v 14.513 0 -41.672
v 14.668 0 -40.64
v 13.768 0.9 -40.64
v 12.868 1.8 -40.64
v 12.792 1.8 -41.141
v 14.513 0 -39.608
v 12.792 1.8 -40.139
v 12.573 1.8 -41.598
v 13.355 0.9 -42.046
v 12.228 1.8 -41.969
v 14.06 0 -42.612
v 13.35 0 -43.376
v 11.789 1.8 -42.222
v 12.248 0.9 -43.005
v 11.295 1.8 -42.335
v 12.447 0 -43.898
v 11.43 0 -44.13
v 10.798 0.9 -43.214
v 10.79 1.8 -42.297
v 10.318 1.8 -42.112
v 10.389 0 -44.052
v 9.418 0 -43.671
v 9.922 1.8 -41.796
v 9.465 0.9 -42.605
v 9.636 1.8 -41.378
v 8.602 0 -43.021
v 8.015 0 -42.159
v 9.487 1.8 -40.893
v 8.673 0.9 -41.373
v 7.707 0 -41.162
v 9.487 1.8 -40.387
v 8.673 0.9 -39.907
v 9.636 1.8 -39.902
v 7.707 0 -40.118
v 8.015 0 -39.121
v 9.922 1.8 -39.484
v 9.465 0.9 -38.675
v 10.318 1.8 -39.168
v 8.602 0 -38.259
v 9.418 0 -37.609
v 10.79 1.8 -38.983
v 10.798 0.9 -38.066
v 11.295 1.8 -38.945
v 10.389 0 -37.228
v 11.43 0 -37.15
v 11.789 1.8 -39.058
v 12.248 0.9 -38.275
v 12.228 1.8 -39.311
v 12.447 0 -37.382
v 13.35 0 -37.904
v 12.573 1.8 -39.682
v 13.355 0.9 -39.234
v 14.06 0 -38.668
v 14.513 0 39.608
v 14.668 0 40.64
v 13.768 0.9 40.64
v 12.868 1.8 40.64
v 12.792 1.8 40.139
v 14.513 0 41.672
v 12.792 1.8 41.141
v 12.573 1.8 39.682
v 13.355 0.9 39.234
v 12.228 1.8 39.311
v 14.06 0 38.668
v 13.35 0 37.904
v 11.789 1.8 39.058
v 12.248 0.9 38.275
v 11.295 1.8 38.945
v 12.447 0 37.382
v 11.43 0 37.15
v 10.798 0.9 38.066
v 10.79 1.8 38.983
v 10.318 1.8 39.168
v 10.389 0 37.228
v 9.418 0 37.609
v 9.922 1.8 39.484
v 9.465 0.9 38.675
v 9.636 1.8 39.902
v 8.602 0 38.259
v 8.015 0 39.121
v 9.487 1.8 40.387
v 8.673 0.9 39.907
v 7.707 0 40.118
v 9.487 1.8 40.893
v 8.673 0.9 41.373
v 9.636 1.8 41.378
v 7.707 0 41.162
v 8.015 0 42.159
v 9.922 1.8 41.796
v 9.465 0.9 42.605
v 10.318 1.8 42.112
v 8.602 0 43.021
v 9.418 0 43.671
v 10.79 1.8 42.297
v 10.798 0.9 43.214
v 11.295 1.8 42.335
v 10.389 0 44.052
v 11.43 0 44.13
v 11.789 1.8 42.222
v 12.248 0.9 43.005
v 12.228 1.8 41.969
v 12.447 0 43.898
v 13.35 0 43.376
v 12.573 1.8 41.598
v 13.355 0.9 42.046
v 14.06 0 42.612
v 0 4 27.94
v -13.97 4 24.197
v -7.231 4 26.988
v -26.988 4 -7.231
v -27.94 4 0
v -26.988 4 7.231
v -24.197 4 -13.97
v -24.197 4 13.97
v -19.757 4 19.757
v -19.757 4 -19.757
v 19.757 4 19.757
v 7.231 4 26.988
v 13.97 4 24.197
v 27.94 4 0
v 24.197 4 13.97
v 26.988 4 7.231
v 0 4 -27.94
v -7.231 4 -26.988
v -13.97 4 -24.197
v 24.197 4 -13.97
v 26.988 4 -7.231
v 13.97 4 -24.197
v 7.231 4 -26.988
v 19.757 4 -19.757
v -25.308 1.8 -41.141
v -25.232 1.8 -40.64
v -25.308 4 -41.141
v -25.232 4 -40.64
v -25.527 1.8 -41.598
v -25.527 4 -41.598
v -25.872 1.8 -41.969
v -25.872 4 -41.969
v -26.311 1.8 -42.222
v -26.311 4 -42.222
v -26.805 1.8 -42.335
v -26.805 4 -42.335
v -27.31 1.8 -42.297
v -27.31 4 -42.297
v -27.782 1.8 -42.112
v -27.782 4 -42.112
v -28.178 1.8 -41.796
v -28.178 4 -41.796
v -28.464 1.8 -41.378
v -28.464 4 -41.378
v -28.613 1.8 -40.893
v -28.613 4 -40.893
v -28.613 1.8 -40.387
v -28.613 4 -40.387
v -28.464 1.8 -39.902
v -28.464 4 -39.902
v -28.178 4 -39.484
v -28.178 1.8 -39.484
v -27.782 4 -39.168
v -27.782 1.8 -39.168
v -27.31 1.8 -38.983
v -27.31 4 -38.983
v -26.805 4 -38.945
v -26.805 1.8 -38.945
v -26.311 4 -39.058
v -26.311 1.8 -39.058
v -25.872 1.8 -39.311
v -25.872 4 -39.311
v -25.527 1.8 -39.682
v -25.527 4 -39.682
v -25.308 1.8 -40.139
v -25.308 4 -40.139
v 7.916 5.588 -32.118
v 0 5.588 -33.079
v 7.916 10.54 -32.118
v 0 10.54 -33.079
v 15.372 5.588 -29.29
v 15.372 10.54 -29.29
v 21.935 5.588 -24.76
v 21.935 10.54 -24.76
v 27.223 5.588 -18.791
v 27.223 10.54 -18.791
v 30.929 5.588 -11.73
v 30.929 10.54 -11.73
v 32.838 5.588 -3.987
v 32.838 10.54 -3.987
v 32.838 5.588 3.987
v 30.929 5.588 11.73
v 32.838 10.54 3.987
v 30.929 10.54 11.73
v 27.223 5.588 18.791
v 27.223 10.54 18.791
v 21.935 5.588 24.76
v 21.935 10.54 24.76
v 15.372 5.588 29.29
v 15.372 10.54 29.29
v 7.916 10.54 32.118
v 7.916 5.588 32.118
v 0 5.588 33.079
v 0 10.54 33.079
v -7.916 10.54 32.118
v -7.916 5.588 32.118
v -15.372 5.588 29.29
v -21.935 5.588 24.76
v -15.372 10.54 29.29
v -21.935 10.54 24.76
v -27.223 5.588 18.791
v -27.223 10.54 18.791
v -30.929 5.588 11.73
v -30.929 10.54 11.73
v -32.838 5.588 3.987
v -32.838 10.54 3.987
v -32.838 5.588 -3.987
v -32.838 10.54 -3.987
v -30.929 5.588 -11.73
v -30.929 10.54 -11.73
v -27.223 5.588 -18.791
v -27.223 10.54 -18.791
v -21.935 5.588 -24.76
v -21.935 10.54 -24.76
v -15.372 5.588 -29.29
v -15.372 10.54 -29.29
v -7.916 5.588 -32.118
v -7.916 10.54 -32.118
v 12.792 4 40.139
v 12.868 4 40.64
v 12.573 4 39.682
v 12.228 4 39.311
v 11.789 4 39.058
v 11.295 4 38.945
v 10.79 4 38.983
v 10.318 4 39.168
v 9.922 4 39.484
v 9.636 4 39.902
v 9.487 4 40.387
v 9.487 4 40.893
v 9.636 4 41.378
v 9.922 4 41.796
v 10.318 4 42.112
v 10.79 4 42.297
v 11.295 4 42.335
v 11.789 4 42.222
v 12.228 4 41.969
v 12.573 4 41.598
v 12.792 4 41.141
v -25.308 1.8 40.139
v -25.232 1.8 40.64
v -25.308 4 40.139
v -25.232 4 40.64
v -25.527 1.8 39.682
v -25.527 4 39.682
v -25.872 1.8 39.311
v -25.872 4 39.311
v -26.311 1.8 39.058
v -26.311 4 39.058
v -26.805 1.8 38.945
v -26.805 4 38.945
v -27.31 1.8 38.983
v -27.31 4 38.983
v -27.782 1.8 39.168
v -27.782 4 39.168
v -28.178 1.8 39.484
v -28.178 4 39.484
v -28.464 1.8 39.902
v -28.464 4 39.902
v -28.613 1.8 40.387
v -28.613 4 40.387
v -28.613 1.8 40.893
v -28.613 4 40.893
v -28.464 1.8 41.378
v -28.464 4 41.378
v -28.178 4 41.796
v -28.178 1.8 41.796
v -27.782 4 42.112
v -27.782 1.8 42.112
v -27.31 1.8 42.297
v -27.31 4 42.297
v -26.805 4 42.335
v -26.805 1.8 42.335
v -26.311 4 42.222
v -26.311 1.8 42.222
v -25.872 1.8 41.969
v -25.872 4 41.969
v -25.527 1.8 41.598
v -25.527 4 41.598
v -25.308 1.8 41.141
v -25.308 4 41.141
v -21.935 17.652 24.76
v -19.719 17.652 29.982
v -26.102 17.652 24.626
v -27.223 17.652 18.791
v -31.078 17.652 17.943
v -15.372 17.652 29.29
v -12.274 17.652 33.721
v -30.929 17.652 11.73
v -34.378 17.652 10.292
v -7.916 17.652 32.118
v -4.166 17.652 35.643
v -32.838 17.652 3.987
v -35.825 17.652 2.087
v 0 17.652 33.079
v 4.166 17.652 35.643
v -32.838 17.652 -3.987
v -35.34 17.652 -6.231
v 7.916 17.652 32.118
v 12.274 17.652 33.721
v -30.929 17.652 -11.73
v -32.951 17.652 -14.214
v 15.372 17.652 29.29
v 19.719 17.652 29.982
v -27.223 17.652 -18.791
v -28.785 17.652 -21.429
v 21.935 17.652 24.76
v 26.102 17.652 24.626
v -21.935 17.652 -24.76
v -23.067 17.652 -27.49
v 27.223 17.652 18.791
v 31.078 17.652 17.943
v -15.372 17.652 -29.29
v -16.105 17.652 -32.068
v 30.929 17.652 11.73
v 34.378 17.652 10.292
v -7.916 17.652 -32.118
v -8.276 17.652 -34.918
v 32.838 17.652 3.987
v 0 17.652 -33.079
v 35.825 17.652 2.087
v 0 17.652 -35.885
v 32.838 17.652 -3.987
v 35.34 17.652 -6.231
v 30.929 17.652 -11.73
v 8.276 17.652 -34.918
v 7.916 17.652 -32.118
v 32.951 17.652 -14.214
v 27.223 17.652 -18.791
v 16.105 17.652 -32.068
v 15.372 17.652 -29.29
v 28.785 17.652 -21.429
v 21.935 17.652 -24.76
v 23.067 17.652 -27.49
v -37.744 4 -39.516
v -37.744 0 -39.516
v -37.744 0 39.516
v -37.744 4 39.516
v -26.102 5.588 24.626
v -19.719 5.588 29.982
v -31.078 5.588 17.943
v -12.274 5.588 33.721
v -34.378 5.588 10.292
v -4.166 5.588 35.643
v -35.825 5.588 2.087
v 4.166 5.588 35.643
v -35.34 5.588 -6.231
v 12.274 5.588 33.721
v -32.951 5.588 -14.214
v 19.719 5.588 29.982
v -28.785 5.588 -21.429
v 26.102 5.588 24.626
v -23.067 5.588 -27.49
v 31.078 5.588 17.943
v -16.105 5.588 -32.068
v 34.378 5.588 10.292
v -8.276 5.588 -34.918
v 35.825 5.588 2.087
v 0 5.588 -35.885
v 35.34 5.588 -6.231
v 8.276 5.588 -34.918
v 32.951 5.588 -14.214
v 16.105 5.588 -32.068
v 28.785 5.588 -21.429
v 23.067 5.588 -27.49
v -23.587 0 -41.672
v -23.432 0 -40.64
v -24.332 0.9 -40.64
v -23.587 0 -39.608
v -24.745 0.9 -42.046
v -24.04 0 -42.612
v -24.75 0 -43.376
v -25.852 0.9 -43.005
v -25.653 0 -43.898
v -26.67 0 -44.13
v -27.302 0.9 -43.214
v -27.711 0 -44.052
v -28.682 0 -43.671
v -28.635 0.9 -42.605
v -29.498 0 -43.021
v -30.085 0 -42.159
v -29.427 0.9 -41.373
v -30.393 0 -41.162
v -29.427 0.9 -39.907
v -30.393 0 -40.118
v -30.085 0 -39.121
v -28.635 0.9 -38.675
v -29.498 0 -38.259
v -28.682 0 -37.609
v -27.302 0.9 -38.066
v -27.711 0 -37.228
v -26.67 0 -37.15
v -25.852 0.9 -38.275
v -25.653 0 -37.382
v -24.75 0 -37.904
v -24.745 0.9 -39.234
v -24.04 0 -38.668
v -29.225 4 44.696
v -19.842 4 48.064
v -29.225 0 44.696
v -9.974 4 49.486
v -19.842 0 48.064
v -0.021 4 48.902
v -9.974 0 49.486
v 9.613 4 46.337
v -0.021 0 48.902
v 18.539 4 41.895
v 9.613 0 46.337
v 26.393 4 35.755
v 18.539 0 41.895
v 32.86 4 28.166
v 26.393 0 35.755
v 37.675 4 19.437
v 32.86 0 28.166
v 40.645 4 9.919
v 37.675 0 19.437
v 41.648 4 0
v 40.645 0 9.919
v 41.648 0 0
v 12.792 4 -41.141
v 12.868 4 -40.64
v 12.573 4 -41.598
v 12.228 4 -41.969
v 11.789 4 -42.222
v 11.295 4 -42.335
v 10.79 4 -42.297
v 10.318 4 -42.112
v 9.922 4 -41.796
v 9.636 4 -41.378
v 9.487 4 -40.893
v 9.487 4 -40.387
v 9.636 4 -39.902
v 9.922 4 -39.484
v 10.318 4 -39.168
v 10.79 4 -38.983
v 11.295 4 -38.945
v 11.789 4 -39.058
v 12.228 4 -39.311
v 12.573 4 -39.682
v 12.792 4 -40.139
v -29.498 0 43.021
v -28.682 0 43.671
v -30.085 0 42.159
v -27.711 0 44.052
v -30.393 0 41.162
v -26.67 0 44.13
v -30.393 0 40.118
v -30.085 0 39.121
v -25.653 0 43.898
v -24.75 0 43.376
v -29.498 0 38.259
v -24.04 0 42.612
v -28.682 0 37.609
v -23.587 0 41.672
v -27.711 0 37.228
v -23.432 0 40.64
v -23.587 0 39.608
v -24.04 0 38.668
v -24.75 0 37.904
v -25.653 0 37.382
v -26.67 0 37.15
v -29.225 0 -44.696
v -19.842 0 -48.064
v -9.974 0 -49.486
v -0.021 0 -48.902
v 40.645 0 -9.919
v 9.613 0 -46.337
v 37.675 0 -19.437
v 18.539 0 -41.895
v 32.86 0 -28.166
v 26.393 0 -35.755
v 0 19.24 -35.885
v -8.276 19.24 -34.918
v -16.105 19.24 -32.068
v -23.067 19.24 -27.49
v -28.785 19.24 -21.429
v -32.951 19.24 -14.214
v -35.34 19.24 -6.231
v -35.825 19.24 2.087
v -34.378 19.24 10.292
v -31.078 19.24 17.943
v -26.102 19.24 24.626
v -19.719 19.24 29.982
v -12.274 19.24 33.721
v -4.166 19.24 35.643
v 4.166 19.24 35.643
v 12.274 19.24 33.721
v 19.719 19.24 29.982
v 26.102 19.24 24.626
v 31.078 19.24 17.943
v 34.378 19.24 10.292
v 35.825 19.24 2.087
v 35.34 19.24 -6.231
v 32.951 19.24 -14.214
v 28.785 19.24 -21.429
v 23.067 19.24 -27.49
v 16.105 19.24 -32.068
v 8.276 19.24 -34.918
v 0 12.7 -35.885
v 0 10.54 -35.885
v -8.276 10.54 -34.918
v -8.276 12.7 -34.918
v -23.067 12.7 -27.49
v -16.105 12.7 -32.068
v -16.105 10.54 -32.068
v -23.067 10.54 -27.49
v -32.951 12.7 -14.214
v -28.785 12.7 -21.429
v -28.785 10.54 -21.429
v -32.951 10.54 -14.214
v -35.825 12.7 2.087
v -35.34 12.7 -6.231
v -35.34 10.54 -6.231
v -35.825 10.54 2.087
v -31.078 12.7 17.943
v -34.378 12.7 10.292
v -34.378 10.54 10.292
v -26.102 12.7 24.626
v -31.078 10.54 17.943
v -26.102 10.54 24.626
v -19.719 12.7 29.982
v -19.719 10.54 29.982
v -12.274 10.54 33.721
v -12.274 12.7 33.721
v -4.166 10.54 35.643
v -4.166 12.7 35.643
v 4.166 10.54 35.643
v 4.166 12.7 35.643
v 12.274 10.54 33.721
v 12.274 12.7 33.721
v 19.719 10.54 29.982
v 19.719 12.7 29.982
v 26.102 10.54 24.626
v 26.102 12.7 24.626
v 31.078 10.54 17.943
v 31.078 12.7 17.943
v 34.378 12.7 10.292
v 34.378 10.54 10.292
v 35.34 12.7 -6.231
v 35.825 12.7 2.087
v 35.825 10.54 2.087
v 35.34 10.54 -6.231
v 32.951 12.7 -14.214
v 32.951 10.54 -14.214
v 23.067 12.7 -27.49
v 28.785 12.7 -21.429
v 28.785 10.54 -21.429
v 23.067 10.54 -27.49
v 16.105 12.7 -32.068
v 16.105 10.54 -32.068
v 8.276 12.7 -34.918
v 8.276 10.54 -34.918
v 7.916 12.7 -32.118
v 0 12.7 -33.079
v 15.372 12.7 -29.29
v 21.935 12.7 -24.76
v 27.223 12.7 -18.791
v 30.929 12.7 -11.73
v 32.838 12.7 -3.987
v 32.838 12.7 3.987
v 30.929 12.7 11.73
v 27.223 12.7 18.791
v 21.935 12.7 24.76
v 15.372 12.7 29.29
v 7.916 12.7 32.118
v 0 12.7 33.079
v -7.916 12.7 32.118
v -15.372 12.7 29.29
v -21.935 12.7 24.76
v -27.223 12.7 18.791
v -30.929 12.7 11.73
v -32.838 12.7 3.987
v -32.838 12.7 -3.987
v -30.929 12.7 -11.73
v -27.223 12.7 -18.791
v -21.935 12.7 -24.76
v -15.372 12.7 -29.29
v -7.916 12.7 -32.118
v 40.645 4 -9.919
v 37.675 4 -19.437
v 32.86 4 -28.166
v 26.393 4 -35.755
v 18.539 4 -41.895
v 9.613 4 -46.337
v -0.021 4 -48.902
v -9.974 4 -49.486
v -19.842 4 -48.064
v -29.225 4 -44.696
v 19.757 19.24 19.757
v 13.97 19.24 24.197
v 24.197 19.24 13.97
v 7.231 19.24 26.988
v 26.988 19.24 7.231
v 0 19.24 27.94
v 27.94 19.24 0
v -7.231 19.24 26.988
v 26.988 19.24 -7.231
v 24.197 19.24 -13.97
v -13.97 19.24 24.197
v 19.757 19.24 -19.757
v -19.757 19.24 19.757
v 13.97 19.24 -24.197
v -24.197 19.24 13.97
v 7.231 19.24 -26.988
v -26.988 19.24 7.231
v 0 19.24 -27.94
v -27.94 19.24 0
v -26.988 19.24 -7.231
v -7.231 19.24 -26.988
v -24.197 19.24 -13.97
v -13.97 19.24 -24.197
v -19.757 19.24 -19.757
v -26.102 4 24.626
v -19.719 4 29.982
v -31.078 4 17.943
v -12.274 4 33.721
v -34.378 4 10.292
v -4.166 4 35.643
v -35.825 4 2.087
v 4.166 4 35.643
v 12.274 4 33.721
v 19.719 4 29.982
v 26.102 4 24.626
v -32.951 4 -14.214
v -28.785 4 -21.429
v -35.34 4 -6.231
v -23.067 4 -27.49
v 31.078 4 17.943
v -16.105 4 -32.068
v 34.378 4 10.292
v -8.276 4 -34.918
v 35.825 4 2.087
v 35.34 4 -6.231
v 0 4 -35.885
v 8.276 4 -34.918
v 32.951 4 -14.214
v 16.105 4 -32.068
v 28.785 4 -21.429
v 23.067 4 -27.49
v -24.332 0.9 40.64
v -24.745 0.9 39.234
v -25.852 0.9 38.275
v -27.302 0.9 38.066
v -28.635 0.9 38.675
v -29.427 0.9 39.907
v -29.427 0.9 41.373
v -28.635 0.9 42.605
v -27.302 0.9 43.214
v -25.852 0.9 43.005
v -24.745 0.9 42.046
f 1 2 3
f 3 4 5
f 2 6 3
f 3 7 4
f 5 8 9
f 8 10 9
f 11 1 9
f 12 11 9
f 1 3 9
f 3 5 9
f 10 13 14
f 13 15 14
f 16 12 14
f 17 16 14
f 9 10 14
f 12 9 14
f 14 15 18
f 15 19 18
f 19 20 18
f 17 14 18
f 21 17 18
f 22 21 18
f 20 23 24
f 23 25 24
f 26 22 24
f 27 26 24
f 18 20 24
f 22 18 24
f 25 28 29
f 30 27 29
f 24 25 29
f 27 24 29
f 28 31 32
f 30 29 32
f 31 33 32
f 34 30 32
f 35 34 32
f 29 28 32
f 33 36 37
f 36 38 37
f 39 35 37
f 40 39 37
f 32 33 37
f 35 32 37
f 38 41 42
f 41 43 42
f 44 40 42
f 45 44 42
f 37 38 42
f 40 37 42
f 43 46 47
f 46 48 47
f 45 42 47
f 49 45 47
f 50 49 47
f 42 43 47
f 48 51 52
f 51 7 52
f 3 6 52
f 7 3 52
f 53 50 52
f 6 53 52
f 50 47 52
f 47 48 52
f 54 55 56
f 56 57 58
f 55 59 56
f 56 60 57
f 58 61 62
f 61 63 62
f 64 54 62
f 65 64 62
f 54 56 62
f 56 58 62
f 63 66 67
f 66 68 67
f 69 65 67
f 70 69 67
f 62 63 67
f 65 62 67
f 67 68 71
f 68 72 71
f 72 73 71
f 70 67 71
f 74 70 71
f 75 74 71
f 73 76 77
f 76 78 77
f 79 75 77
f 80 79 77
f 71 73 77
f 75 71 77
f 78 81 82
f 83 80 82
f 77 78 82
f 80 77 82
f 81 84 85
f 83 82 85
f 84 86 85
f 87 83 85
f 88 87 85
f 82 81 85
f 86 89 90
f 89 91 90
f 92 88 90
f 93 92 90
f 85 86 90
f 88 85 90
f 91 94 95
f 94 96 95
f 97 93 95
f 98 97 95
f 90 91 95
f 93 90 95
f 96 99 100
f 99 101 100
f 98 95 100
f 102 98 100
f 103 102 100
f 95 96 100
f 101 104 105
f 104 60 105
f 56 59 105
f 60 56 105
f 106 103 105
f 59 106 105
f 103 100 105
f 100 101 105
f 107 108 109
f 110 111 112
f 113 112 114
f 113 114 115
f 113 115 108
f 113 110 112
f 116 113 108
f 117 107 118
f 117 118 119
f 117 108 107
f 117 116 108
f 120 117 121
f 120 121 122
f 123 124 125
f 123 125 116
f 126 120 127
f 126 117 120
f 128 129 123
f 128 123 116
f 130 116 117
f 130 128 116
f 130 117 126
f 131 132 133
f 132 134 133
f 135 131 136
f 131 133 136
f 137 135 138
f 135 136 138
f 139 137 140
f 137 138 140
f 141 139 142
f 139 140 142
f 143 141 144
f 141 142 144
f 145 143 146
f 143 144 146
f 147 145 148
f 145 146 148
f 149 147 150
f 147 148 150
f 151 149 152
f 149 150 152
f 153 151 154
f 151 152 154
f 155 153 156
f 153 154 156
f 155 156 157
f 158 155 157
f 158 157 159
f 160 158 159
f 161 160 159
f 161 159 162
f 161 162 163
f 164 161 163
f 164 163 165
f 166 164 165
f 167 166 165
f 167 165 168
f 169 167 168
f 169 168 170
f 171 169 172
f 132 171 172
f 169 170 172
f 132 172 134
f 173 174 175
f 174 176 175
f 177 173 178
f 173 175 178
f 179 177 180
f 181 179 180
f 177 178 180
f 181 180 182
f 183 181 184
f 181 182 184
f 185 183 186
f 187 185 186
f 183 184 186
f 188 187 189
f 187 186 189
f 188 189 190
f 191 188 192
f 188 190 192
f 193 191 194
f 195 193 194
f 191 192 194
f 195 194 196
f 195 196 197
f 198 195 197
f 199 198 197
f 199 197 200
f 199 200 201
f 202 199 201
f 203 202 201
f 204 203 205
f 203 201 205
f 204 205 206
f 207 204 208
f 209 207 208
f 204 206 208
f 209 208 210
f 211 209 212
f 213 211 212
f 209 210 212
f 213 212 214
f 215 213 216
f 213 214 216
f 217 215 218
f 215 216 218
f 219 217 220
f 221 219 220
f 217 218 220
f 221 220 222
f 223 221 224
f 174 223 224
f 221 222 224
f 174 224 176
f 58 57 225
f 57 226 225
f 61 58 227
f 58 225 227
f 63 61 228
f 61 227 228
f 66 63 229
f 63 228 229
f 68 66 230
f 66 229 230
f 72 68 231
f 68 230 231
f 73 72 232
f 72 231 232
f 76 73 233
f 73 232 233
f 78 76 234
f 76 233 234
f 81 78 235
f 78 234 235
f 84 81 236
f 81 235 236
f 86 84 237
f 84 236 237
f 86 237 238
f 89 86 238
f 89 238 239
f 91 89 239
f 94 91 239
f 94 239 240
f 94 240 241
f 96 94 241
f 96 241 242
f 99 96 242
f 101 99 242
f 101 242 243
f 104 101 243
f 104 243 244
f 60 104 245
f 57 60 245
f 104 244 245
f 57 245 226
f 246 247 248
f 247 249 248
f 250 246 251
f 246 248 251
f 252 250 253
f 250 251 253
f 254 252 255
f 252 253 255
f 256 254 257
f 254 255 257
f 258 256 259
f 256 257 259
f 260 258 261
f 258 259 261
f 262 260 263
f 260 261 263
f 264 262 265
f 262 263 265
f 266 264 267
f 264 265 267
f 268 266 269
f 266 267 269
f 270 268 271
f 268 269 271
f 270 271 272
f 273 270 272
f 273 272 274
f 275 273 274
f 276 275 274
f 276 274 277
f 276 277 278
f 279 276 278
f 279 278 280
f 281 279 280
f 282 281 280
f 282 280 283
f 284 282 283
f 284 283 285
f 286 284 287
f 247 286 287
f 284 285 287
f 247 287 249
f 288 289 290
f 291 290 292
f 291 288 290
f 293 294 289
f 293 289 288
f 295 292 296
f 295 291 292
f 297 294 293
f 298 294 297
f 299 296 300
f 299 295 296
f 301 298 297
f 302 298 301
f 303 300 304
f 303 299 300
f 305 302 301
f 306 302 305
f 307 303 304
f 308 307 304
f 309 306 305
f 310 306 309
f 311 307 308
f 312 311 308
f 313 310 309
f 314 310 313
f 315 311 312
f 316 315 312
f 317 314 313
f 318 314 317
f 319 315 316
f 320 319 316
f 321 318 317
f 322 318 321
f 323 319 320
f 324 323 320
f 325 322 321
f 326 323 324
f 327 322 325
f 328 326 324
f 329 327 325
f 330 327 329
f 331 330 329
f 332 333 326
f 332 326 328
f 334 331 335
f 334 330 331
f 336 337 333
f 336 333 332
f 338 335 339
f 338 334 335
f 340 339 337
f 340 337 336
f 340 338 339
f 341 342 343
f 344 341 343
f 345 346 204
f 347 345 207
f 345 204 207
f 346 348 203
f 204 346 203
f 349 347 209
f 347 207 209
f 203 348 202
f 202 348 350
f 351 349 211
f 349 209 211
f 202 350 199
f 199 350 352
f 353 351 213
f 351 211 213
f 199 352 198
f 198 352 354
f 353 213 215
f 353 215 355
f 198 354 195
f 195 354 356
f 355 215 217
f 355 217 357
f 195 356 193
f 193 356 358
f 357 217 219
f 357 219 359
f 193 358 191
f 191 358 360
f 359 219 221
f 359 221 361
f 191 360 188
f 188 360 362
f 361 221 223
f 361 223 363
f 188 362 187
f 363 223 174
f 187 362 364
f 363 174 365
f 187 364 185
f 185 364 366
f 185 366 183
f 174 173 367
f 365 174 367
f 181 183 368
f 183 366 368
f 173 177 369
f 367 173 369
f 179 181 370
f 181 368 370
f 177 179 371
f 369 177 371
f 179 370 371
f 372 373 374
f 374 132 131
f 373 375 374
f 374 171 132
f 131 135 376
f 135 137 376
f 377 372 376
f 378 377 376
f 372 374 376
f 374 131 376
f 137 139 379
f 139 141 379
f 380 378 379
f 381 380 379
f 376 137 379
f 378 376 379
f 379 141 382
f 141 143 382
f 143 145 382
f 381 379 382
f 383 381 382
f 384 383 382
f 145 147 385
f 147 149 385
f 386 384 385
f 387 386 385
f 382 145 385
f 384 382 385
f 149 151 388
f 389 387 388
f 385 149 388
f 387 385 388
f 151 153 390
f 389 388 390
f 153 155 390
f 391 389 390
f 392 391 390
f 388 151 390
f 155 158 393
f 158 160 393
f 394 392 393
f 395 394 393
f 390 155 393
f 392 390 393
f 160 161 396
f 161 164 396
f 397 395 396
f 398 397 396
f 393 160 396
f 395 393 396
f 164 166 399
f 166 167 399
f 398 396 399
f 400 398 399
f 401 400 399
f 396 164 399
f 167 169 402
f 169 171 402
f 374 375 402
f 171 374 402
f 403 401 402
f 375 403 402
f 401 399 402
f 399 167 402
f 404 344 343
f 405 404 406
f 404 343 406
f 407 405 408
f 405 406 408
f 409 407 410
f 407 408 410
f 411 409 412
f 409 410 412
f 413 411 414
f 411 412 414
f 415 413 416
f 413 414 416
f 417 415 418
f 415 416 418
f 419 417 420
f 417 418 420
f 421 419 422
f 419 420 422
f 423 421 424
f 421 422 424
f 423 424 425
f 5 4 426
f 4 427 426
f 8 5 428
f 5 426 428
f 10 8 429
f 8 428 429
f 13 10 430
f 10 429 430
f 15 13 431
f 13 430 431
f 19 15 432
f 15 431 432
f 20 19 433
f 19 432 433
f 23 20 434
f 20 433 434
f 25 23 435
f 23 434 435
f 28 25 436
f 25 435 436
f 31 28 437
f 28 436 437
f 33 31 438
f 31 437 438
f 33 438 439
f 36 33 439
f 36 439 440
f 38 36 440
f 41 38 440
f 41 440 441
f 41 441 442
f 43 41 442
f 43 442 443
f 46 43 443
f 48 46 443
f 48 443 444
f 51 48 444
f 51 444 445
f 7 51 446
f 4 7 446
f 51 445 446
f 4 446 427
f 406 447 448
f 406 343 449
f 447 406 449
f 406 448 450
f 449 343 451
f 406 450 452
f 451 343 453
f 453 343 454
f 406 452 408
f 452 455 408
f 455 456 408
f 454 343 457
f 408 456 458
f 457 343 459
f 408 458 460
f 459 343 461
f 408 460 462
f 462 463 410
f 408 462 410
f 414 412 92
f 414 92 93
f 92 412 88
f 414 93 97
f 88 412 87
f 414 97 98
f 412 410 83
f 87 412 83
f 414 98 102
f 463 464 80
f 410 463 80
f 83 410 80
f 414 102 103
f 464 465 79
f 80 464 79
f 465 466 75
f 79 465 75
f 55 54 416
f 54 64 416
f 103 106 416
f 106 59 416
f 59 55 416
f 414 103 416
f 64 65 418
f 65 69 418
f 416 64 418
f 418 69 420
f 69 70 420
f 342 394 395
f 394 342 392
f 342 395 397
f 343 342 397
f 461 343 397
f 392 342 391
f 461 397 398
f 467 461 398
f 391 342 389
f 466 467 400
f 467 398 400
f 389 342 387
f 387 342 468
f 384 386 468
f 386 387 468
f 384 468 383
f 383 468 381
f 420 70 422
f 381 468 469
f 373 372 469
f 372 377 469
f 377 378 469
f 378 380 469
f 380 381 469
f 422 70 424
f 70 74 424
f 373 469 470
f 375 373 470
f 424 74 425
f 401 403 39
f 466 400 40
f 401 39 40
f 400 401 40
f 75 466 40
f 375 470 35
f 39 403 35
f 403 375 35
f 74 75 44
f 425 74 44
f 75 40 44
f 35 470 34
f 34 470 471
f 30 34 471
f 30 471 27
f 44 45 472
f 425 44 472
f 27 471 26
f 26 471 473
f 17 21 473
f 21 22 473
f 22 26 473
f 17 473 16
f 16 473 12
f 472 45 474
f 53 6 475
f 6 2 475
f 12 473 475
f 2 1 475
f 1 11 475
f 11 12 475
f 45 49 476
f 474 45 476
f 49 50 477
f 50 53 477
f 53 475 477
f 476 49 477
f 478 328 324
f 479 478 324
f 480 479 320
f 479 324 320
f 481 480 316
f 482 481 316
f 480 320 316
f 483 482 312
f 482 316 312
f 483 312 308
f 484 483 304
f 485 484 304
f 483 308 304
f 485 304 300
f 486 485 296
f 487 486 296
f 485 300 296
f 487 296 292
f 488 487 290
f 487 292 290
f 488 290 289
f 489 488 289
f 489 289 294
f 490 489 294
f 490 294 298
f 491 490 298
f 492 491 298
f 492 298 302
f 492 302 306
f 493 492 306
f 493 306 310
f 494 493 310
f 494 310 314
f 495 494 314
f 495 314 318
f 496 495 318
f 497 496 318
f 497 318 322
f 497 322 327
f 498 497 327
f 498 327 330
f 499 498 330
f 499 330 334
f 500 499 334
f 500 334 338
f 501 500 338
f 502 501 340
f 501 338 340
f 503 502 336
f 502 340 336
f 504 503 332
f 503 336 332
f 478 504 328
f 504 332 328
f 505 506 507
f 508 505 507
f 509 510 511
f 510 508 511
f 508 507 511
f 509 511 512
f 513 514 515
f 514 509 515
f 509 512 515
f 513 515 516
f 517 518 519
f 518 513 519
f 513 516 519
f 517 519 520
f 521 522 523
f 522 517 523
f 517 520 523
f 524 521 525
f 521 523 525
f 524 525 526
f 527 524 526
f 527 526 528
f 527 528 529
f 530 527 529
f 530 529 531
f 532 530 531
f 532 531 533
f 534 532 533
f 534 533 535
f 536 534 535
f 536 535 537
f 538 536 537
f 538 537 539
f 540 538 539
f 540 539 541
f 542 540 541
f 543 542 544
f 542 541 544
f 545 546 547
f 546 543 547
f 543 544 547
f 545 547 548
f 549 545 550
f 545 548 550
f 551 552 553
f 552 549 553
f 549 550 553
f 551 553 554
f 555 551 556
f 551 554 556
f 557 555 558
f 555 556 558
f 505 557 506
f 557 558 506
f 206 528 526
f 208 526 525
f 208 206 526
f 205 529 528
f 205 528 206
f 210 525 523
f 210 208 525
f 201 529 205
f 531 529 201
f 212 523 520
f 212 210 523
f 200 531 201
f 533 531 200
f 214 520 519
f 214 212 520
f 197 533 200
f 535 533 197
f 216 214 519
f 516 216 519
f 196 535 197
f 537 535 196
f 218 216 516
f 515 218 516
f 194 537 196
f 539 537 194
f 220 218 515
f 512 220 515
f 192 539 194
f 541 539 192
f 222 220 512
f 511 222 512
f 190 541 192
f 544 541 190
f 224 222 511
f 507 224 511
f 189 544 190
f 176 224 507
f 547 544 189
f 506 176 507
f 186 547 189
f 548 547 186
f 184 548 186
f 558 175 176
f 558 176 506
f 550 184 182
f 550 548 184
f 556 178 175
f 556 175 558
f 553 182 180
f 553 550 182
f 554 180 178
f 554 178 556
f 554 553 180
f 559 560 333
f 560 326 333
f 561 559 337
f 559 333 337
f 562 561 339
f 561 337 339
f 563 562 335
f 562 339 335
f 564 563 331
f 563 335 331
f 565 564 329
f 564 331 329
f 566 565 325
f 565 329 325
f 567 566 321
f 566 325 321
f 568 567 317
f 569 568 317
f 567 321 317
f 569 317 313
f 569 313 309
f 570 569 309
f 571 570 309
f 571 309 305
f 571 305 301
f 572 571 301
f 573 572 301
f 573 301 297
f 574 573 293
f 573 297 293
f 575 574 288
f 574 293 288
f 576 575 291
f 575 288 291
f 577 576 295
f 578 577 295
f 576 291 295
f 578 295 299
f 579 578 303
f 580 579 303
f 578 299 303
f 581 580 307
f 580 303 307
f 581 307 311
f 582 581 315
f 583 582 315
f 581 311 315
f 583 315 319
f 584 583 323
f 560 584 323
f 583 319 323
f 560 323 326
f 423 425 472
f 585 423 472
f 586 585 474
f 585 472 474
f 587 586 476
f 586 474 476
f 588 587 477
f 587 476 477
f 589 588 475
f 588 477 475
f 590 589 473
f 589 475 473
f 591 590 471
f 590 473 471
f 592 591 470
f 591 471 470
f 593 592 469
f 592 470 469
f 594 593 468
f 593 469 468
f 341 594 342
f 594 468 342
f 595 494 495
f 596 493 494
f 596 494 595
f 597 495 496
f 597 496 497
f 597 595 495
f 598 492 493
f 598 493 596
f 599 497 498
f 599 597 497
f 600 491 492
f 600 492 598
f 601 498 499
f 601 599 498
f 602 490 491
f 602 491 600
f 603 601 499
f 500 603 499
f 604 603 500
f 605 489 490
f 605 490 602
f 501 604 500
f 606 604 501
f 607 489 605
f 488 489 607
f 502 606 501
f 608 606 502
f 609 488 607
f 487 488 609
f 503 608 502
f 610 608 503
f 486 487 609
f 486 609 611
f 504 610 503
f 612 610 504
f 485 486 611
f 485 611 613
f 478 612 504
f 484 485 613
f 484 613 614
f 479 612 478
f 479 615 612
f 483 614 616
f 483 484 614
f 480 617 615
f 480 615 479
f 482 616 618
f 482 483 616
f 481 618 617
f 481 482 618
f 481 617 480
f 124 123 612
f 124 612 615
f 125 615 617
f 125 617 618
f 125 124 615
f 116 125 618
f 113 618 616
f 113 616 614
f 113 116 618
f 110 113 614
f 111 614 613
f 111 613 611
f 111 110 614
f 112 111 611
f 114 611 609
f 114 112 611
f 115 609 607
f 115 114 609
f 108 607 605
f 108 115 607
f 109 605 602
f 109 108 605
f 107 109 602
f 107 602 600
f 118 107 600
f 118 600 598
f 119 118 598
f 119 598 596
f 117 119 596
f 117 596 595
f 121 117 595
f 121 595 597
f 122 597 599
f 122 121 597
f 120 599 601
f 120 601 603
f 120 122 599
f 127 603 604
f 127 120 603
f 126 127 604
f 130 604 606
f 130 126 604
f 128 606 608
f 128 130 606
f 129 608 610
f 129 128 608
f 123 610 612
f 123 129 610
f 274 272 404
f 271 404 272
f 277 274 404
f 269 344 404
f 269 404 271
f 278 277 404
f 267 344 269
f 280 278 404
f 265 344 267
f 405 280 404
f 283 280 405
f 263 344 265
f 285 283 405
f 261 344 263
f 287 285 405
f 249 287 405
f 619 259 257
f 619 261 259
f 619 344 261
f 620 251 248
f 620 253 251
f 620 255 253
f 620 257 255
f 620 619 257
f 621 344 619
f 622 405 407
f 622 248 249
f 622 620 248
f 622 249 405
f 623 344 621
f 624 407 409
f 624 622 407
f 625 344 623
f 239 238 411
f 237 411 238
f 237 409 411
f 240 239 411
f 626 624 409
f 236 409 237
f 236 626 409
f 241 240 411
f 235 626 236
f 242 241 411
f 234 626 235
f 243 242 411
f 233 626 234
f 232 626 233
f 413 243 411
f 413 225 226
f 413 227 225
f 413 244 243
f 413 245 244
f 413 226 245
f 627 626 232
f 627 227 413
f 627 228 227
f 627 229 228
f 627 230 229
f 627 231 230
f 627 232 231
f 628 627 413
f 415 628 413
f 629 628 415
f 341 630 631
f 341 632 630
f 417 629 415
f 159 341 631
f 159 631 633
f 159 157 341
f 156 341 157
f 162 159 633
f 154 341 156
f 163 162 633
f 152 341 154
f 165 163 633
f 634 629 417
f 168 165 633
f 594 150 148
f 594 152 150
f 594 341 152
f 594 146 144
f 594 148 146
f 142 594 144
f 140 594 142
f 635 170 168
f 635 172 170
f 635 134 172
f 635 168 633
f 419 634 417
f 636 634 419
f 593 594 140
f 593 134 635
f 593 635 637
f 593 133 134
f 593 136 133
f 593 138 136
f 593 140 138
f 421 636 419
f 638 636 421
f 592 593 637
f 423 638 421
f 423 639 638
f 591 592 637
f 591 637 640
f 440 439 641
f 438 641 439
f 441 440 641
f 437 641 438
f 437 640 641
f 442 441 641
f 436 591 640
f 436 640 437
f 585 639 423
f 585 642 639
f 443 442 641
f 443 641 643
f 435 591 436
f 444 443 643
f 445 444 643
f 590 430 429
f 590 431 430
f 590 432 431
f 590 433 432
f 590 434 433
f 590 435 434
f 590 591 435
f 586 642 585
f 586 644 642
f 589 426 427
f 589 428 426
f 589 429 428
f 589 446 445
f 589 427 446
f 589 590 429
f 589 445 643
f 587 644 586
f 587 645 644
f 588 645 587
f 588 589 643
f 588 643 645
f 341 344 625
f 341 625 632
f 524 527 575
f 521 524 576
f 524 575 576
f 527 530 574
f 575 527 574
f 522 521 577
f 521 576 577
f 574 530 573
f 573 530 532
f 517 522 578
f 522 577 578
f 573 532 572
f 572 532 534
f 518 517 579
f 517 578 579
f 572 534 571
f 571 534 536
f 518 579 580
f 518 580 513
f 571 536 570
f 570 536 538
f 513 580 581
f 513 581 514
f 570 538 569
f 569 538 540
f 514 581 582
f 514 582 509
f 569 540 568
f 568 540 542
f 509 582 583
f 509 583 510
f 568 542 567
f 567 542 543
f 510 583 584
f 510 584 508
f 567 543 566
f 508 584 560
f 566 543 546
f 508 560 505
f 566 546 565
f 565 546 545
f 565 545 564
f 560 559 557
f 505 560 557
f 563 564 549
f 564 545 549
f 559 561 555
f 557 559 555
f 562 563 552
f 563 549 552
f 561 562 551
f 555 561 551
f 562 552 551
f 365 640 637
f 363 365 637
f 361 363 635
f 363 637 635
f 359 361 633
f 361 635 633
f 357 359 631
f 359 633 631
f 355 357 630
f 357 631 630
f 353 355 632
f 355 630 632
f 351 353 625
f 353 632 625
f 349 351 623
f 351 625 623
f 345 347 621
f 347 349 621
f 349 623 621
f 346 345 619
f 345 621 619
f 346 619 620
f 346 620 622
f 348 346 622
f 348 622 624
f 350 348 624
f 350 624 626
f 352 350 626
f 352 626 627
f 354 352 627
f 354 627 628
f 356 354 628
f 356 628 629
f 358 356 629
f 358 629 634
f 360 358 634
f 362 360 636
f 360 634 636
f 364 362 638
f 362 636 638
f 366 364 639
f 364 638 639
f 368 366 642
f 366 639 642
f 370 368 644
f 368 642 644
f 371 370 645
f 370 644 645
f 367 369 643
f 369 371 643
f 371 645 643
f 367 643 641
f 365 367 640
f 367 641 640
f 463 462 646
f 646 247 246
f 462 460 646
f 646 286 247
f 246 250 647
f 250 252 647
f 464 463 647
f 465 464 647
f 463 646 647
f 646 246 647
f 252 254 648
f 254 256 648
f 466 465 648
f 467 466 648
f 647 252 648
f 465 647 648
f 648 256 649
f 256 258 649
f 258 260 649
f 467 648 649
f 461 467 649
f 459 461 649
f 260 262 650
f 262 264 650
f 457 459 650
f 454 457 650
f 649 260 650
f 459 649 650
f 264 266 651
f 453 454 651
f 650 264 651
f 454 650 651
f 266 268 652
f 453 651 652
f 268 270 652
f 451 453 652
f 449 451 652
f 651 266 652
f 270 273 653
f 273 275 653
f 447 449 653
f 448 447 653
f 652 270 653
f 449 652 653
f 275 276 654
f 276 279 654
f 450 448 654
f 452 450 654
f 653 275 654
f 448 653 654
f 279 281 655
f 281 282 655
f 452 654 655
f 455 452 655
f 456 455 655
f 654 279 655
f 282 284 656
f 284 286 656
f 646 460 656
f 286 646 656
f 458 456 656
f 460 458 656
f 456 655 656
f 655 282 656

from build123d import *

# Parameters (mm, degrees)
BOSS_EXTRUDE1_DEPTH                             = 4
SKETCH2_R                                       = 35.885499984
SKETCH2_R_2                                     = 27.94
BOSS_EXTRUDE2_DEPTH                             = 15.24
SKETCH5_W                                       = 2.8067
SKETCH5_H                                       = 4.953
SKETCH10_W                                      = 10.702500058
SKETCH10_H                                      = 79.03151748
CUT_EXTRUDE2_DEPTH                              = 72.905773325
CSK_FOR_M3_FLAT_HEAD_MACHINE_SCREW1_D           = 3.4
CSK_FOR_M3_FLAT_HEAD_MACHINE_SCREW1_CSINK_D     = 7
CSK_FOR_M3_FLAT_HEAD_MACHINE_SCREW1_CSINK_ANGLE = 90


with BuildPart() as part:
    # Sketch1 → Boss-Extrude1 (new body)
    with BuildSketch(Plane(origin=(0, 0, 0), x_dir=(1, 0, 0), z_dir=(0, 1, 0))):
        with BuildLine():
            Line((-48.446276818, 28.421125), (-48.446276818, 0))
            Line((-48.446276818, 0), (41.648, 0))
            ThreePointArc((41.648, 0), (7.018876975, 47.235418548), (-48.446276818, 28.421125))
        make_face()
        with BuildLine():
            Line((41.648, 0), (-48.446276818, 0))
            Line((-48.446276818, 0), (-48.446276818, -28.421125))
            ThreePointArc((-48.446276818, -28.421125), (7.018876975, -47.235418548), (41.648, 0))
        make_face()
    extrude(amount=BOSS_EXTRUDE1_DEPTH)

    # Sketch2 → Boss-Extrude2 (add)
    with BuildSketch(Plane(origin=(0, 4, 0), x_dir=(1, 0, 0), z_dir=(0, 1, 0))):
        with Locations(Location((0, 0, 0), (0, 0, 90))):
            Circle(SKETCH2_R)
        with Locations(Location((0, 0, 0), (0, 0, 90))):
            Circle(SKETCH2_R_2, mode=Mode.SUBTRACT)
    extrude(amount=BOSS_EXTRUDE2_DEPTH)

    # Sketch5 → Cut-Revolve1 (revolve, cut)
    with BuildSketch(Plane(origin=(0, 0, 0), x_dir=(0, 0, -1), z_dir=(1, 0, 0)), mode=Mode.PRIVATE) as cut_revolve1_sk:
        with Locations((-34.482149984, 8.064)):
            Rectangle(SKETCH5_W, SKETCH5_H)
        with Locations((-34.482149984, 15.176)):
            Rectangle(SKETCH5_W, SKETCH5_H)
    revolve(cut_revolve1_sk.sketch.rotate(Axis((0, 19.24, 0), (0, -1, 0)), 180), axis=Axis((0, 19.24, 0), (0, -1, 0)), mode=Mode.SUBTRACT)

    # Sketch10 → Cut-Extrude2 (cut, through all)
    with BuildSketch(Plane.XZ):
        with Locations((-43.095026789, 0)):
            Rectangle(SKETCH10_W, SKETCH10_H)
    extrude(amount=-CUT_EXTRUDE2_DEPTH, mode=Mode.SUBTRACT)

    # CSK for M3 Flat Head Machine Screw1 (through all)
    with Locations(Plane(origin=(0, 0, 0), x_dir=(-1, 0, 0), z_dir=(0, -1, 0))):
        with Locations((26.932, -40.64), (-11.168, -40.64), (-11.168, 40.64), (26.932, 40.64)):
            CounterSinkHole(CSK_FOR_M3_FLAT_HEAD_MACHINE_SCREW1_D / 2, CSK_FOR_M3_FLAT_HEAD_MACHINE_SCREW1_CSINK_D / 2, counter_sink_angle=CSK_FOR_M3_FLAT_HEAD_MACHINE_SCREW1_CSINK_ANGLE)


solid = part.part
